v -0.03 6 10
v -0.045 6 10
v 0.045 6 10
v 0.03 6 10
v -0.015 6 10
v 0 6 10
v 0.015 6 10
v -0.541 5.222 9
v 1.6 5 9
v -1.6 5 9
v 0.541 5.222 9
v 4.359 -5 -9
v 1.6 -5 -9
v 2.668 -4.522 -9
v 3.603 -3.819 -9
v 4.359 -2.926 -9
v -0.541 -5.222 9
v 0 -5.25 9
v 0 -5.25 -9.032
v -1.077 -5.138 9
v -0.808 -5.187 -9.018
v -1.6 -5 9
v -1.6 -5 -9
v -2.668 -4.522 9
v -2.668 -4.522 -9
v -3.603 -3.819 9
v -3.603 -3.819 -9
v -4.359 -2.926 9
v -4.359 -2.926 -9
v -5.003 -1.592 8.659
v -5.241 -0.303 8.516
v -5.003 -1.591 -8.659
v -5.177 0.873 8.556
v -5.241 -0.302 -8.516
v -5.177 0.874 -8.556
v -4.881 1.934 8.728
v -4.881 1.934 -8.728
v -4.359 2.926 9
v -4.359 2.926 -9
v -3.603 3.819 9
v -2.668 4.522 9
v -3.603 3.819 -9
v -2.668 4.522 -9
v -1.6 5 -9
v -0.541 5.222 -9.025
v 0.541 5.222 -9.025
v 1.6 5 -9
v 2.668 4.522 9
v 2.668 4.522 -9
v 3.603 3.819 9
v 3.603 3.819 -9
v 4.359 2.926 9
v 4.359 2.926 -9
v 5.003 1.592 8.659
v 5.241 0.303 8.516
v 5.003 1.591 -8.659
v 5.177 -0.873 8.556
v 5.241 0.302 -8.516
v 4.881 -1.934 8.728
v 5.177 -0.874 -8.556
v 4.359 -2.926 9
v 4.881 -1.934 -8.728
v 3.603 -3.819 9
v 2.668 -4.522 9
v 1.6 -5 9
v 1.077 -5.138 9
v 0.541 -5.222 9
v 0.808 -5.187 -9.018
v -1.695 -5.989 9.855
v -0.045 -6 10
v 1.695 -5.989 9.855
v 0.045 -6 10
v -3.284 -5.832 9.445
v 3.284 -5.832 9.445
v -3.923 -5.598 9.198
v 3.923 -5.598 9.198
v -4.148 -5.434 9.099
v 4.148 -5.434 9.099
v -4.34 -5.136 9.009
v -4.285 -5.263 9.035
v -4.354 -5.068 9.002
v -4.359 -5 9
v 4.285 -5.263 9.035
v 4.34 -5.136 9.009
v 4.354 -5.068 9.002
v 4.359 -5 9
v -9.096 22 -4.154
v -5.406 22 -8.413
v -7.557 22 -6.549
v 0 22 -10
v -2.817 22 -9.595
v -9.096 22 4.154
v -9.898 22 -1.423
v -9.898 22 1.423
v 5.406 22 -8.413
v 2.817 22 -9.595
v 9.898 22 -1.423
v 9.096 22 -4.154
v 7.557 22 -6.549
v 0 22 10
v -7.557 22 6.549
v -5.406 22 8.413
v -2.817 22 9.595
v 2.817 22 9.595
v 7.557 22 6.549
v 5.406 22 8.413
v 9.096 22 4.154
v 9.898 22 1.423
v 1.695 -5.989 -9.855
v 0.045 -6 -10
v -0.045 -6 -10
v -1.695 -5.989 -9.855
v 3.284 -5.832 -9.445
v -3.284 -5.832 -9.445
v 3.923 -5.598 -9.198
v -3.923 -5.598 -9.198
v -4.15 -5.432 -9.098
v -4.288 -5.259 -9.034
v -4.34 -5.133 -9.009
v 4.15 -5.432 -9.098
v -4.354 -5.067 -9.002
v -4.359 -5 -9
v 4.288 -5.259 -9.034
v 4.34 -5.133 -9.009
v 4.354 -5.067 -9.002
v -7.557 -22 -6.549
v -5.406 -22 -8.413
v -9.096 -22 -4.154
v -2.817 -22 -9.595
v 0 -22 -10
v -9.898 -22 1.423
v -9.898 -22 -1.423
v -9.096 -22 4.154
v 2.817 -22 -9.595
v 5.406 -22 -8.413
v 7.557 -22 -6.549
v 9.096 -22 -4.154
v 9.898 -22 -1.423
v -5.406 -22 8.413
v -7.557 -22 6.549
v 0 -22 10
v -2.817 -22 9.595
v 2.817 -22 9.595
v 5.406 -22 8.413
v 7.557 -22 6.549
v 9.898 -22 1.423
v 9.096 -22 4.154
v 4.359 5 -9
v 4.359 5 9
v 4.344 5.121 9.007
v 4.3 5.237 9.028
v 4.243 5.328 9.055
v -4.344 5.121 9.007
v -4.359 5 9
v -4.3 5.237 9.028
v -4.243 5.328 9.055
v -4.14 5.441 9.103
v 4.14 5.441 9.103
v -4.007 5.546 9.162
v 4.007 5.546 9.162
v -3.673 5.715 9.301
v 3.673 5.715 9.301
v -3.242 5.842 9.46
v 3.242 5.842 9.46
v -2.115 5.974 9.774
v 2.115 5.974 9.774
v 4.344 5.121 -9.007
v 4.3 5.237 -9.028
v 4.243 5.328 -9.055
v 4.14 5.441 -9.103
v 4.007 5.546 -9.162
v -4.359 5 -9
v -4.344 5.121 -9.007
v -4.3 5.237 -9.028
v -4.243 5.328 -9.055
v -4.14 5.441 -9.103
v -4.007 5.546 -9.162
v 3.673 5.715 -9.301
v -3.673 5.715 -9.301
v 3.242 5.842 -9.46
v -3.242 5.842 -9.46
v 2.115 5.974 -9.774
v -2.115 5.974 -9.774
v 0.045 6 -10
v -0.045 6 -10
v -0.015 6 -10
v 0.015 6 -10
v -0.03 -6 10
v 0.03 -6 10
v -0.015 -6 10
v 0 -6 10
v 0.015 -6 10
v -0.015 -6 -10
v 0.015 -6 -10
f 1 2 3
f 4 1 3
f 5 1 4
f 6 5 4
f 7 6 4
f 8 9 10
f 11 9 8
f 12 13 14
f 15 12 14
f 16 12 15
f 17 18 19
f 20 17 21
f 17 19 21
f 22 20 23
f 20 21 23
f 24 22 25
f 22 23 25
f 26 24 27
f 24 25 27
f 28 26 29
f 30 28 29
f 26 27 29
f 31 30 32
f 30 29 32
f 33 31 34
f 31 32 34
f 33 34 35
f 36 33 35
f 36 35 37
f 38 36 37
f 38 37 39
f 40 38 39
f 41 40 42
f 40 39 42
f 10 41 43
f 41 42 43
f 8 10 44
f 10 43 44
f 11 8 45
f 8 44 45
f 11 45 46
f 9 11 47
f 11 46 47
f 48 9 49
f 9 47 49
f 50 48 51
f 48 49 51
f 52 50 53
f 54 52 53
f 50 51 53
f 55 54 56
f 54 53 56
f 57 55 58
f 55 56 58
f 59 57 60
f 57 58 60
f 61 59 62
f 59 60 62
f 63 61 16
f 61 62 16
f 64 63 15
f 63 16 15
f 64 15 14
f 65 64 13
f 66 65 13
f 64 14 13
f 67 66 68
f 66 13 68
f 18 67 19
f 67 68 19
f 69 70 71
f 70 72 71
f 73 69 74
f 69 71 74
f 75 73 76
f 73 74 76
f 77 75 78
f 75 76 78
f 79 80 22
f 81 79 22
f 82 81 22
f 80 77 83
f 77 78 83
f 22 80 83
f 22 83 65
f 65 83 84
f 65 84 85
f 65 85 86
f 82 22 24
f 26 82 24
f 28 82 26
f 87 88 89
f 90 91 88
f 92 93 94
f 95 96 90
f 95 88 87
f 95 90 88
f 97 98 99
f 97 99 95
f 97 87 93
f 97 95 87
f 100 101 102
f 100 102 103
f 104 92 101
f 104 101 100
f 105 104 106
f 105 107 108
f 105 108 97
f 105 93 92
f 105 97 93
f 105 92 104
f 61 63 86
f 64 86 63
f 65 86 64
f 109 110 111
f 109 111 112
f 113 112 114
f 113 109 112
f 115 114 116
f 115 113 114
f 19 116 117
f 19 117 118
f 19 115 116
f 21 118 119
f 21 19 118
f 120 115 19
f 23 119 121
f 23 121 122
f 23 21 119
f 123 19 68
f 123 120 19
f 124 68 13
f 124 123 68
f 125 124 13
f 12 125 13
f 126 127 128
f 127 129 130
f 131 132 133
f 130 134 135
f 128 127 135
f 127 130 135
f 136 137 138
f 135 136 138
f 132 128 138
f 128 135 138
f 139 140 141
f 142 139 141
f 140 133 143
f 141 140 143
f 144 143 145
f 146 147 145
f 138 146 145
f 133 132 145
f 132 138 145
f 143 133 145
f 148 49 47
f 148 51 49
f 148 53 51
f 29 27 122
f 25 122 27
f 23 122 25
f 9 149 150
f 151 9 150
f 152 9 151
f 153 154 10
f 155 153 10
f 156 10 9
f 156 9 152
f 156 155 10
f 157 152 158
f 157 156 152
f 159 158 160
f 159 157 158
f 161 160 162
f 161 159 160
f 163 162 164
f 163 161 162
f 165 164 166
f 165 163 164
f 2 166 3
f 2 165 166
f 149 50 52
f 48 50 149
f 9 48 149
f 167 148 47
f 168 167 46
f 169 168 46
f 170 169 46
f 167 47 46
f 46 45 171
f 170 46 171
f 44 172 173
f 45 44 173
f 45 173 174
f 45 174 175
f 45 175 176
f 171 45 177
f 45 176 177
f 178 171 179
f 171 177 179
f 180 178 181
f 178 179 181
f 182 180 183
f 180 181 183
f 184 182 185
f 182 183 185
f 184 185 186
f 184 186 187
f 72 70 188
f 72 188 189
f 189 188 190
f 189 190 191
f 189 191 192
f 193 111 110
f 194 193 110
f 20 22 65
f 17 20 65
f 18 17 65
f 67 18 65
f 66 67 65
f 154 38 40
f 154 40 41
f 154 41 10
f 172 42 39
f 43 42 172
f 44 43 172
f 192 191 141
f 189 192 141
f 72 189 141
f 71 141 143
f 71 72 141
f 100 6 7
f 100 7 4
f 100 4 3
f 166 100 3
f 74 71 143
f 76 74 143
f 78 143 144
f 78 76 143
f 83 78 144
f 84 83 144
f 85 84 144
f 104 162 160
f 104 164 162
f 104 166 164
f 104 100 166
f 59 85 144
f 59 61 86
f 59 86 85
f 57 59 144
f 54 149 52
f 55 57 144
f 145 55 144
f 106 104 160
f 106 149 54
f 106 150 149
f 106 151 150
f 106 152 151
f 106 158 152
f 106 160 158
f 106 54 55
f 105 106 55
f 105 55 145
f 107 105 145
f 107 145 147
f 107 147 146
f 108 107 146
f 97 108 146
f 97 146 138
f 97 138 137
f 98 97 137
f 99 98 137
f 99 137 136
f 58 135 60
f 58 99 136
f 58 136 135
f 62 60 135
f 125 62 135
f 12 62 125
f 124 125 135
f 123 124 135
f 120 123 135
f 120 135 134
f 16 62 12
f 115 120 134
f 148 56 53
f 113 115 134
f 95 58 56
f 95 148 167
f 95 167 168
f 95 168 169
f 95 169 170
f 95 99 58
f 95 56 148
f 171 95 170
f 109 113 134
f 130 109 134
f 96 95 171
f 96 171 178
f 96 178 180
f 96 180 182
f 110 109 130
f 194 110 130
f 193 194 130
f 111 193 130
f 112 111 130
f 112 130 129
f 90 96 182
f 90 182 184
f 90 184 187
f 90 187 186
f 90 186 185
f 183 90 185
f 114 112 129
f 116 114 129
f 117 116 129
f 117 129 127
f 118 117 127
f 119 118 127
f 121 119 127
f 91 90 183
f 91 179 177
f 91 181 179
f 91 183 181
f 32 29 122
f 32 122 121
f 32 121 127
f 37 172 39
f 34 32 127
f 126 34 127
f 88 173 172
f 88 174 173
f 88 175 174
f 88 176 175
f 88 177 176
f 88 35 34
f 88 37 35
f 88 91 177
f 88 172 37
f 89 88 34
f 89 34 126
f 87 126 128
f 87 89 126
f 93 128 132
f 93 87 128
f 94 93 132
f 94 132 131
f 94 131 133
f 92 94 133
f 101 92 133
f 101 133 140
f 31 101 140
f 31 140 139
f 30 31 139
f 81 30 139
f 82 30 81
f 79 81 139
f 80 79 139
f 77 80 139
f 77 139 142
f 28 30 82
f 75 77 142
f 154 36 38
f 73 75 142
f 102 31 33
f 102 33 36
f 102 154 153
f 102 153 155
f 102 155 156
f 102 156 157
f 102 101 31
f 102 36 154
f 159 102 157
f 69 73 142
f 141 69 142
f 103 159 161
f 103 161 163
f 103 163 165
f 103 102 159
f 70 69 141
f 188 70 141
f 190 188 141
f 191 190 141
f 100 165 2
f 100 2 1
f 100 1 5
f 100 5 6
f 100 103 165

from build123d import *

# Parameters (mm, degrees)
SKETCH_1_R          = 10
EXTRUDE_1_DEPTH     = 22
SKETCH_4_W          = 3.52564581
SKETCH_4_H          = 12
CUT_EXTRUDE_1_DEPTH = 22
FILLET_1_R          = 1
SKETCH2_W           = 5.25
SKETCH2_H           = 19


with BuildPart() as part:
    # ｽｹｯﾁ1 → ﾎﾞｽ - 押し出し1 (new, symmetric)
    with BuildSketch(Plane(origin=(0, 0, 0), x_dir=(1, 0, 0), z_dir=(0, 1, 0))):
        with Locations(Location((0, 0, 0), (0, 0, 270))):
            Circle(SKETCH_1_R)
    extrude(amount=EXTRUDE_1_DEPTH, both=True)

    # ｽｹｯﾁ4 → ｶｯﾄ - 押し出し1 (cut, symmetric)
    with BuildSketch(Plane(origin=(0, 0, 0), x_dir=(0, 0, -1), z_dir=(1, 0, 0))):
        with Locations((-10.762822905, 0)):
            Rectangle(SKETCH_4_W, SKETCH_4_H)
        with Locations((10.762822905, 0)):
            Rectangle(SKETCH_4_W, SKETCH_4_H)
    extrude(amount=CUT_EXTRUDE_1_DEPTH, both=True, mode=Mode.SUBTRACT)

    # ﾌｨﾚｯﾄ1
    fillet_1_edges = [part.edges().sort_by_distance(p)[0] for p in [
        (0, -6, -9),
        (0, 6, -9),
        (0, -6, 9),
        (0, 6, 9),
    ]]
    fillet(fillet_1_edges, radius=FILLET_1_R - 0.0001)  # a hair under: the kernel refuses the full size

    # Sketch2 → M12x1.5 ねじ穴1 (revolve, cut)
    with BuildSketch(Plane(origin=(0, 0, 9), x_dir=(0, -1, 0), z_dir=(1, 0, 0))):
        with Locations((2.625, 9.5)):
            Rectangle(SKETCH2_W, SKETCH2_H)
    revolve(axis=Axis((0, 0, 15.35), (0, 0, -1)), mode=Mode.SUBTRACT)


solid = part.part
